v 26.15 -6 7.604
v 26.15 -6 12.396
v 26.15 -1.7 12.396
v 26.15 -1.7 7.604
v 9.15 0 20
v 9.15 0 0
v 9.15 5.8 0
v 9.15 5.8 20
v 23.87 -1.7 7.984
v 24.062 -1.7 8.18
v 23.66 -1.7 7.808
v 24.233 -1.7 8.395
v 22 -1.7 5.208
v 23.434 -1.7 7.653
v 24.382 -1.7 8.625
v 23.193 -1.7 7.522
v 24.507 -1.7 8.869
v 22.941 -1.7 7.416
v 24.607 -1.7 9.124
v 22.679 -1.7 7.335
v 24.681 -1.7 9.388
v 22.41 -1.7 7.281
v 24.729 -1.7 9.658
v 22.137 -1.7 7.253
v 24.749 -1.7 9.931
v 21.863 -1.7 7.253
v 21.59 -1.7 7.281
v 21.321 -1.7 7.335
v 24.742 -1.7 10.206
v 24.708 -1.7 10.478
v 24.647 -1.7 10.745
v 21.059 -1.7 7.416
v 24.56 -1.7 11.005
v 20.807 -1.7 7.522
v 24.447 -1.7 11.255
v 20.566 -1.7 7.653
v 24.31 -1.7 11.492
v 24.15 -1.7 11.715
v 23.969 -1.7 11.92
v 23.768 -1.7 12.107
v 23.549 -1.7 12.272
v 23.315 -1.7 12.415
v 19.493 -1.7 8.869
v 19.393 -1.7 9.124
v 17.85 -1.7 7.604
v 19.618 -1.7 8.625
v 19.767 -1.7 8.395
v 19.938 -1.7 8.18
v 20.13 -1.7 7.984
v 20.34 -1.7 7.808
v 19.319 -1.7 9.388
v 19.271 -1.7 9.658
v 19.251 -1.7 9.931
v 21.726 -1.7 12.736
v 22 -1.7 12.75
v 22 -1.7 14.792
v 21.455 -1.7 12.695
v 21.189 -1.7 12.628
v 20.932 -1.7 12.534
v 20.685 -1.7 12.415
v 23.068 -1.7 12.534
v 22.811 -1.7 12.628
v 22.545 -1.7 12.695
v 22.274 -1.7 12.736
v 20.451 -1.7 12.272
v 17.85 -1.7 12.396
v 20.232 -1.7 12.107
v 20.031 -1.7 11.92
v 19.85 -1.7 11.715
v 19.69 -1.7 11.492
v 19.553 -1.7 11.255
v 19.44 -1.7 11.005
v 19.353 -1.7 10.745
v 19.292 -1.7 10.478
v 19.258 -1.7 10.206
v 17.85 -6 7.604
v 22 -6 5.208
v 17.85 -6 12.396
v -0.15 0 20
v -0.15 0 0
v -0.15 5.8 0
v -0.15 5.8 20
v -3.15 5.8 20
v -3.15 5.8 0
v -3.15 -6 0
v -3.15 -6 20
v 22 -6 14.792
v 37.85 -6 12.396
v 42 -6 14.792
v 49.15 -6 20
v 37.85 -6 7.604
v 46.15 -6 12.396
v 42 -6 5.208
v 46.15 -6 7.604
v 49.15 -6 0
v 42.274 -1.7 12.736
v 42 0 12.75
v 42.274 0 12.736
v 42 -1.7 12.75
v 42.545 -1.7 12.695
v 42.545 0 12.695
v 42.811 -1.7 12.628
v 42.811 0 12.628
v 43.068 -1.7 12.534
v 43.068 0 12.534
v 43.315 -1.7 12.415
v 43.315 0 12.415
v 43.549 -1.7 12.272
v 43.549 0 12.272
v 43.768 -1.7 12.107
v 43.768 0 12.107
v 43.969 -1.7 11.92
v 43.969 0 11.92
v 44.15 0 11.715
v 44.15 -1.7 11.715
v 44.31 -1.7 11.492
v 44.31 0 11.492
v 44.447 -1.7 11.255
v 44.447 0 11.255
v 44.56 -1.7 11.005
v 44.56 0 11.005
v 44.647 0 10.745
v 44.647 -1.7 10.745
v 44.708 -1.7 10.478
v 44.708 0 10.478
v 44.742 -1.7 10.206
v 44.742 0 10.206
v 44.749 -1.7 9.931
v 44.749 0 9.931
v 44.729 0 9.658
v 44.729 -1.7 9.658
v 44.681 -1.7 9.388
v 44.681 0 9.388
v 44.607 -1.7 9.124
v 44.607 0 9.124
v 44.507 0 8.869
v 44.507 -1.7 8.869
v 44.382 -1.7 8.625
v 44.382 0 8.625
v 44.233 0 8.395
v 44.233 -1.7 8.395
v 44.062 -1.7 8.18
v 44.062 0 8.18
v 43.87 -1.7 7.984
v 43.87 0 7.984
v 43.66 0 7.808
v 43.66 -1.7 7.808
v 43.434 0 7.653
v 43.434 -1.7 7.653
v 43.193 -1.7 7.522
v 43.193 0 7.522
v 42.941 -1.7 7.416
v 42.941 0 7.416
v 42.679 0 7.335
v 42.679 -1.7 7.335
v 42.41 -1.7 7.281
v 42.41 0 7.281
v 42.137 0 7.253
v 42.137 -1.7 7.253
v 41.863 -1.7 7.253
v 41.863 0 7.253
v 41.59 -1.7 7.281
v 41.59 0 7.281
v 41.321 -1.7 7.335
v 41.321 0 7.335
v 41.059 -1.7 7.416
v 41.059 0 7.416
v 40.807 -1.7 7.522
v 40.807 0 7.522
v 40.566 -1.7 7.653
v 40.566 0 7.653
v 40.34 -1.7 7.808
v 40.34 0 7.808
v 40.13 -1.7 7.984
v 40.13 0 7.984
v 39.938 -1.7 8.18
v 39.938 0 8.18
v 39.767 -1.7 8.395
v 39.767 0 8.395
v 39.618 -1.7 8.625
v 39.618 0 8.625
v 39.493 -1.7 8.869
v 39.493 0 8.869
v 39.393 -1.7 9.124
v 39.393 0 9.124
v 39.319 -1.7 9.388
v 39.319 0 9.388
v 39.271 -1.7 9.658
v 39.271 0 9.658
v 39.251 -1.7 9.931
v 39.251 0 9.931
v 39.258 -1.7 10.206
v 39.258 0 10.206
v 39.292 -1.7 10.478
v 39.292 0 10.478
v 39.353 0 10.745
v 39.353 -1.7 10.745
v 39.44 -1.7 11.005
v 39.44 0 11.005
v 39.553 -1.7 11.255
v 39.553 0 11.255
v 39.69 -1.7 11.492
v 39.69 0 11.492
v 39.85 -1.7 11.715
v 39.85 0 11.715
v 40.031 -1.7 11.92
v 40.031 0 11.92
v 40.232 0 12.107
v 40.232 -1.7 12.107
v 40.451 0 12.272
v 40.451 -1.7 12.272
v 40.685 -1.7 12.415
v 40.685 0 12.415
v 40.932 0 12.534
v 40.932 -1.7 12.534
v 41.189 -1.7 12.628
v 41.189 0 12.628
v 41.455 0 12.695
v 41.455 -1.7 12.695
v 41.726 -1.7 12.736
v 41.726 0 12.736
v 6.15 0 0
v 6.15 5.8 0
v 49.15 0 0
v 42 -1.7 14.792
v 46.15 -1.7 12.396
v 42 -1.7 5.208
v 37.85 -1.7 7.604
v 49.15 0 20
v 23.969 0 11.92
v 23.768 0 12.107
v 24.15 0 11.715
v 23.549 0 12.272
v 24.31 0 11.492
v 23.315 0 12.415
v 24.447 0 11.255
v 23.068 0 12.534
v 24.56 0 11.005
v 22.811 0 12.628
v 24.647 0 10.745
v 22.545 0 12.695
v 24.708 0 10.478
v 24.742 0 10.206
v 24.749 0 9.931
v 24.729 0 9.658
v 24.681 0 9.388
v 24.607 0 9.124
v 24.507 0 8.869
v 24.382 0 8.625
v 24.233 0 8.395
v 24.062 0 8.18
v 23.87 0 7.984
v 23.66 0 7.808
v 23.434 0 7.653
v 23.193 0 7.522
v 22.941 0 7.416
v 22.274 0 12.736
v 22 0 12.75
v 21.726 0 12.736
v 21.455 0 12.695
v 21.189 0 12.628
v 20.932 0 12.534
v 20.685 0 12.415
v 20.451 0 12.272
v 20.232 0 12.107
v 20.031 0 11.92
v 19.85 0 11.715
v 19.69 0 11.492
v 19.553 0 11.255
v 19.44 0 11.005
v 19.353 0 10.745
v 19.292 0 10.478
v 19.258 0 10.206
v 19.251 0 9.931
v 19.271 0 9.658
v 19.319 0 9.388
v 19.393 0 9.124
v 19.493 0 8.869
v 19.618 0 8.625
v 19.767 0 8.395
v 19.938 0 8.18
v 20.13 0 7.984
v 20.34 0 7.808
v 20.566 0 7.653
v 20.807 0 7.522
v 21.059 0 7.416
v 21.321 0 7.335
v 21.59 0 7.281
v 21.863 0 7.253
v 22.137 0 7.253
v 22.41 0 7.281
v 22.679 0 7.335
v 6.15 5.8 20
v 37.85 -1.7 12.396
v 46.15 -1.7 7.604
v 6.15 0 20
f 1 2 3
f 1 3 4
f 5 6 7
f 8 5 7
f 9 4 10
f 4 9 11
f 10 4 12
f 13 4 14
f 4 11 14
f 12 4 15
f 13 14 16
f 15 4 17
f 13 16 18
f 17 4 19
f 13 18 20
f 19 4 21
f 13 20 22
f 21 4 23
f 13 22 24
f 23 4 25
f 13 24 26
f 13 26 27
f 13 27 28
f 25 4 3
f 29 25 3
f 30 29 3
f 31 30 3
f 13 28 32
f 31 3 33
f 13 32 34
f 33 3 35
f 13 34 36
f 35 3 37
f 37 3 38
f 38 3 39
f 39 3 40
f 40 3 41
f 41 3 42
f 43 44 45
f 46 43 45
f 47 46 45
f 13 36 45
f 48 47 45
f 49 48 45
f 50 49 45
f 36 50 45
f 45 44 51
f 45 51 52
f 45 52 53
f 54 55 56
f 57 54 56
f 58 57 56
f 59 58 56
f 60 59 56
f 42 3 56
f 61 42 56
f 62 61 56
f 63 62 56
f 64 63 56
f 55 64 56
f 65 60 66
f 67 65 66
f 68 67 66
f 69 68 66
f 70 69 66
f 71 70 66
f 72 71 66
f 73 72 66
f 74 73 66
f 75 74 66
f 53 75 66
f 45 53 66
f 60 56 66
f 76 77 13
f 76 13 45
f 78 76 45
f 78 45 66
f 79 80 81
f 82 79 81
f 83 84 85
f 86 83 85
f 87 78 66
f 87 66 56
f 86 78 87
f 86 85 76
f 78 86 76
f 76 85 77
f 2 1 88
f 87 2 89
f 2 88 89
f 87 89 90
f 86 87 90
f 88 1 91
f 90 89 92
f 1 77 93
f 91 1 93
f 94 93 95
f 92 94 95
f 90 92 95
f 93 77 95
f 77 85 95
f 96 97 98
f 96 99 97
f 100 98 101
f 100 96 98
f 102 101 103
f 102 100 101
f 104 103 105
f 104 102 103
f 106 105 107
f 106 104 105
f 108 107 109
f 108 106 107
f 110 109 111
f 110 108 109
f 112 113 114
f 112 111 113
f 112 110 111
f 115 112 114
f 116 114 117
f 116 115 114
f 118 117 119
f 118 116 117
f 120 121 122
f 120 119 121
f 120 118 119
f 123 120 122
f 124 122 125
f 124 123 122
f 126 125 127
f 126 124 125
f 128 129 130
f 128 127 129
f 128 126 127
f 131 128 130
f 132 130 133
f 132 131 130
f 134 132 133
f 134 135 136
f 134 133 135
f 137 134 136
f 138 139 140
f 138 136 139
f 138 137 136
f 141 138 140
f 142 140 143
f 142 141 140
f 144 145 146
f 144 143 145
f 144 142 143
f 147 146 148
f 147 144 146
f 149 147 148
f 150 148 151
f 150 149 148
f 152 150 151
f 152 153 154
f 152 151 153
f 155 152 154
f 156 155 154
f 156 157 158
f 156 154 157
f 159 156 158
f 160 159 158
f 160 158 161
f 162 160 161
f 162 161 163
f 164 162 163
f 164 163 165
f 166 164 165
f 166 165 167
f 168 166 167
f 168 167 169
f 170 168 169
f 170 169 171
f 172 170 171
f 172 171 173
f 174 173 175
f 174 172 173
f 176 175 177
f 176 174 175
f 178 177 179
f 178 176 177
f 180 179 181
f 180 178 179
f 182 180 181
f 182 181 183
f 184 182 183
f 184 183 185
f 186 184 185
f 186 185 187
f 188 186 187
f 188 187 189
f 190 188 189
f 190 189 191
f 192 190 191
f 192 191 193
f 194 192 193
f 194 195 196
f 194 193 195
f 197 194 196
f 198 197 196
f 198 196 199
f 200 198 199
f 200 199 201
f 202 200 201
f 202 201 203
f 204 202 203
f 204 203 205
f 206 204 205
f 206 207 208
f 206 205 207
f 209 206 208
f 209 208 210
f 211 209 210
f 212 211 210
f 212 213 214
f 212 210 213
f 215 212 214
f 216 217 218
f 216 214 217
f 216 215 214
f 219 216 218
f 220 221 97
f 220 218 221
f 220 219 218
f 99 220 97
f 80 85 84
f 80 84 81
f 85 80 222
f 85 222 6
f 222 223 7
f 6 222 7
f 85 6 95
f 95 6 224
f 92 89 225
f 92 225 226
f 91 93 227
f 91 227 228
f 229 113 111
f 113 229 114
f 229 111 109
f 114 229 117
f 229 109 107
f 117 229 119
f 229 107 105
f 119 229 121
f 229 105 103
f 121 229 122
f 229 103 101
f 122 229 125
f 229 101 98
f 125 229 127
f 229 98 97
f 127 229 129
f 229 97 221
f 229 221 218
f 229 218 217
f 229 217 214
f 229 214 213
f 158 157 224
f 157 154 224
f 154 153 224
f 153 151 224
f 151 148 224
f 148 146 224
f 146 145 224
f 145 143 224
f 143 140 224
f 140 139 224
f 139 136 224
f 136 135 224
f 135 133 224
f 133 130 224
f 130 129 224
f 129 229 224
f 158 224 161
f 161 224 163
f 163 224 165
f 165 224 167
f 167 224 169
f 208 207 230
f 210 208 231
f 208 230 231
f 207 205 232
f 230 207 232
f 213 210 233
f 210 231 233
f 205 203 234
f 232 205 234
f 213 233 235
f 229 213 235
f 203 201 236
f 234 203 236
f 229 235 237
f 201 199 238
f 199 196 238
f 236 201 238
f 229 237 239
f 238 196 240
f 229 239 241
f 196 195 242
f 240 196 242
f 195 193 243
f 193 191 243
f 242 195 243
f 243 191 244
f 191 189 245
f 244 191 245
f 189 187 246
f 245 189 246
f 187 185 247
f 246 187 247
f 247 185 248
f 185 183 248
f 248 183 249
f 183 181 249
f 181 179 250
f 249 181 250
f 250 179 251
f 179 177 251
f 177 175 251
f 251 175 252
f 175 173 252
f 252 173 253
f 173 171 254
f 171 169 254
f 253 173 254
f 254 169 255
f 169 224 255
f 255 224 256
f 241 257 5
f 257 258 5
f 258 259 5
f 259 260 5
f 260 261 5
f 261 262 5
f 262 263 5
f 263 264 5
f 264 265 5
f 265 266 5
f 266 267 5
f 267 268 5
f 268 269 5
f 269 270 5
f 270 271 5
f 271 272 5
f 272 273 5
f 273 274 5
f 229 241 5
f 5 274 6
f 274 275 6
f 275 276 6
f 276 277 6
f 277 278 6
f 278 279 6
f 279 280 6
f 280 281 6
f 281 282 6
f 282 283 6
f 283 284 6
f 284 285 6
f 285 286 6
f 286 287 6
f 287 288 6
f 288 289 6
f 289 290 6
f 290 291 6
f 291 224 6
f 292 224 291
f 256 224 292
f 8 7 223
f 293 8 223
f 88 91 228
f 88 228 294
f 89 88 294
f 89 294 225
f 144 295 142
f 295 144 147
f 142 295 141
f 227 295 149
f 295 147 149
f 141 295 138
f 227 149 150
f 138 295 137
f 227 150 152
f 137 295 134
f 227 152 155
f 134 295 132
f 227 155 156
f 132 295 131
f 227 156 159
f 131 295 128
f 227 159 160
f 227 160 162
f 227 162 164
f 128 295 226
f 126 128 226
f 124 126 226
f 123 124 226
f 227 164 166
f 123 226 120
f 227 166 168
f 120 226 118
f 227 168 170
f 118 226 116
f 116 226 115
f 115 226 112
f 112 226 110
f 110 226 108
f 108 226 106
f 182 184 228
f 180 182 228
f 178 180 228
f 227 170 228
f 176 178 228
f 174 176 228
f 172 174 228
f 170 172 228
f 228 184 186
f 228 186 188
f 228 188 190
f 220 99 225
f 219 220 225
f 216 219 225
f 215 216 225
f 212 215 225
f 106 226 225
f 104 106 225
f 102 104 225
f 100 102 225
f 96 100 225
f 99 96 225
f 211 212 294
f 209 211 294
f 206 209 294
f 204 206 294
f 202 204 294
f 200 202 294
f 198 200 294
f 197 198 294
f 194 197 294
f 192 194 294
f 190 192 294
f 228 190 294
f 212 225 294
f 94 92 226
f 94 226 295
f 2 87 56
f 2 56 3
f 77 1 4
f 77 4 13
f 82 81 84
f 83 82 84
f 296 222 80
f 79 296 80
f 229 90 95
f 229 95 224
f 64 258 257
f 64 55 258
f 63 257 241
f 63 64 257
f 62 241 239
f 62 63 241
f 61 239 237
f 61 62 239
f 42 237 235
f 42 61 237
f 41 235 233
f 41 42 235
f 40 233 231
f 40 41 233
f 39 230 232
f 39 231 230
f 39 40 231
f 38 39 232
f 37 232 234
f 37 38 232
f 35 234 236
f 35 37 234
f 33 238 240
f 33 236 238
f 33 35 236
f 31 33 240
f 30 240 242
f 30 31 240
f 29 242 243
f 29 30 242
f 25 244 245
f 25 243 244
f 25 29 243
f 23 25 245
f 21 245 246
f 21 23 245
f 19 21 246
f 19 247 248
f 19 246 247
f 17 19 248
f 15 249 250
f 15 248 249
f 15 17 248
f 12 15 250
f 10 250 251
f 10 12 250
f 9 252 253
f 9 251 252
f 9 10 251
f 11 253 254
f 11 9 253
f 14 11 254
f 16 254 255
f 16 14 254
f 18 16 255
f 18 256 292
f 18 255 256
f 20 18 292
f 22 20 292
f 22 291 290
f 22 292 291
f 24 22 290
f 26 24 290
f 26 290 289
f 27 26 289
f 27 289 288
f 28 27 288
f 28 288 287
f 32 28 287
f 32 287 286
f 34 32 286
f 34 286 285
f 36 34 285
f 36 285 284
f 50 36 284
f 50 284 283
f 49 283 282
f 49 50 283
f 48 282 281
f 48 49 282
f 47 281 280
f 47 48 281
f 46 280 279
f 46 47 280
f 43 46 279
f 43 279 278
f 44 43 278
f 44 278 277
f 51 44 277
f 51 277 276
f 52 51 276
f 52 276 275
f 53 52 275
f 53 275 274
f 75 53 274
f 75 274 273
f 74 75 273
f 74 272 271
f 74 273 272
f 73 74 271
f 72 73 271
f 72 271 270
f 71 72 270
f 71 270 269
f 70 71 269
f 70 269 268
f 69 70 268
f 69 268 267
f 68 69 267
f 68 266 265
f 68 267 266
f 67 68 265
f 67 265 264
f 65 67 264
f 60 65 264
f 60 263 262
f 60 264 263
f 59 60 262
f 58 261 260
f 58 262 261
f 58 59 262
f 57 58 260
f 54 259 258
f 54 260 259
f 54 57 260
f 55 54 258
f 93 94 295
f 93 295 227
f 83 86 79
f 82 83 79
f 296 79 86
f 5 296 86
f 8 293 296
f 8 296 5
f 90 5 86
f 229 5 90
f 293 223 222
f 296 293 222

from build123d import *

# Parameters (mm, degrees)
EXTRUDE_20_DEPTH         = 20
CUT_EXTRUDE_5_DEPTH      = 54.401521514
CUT_EXTRUDE_5_DEPTH_BACK = 54.401521514
SKETCH_5_R               = 2.75
CUT_EXTRUDE_5_4_3_DEPTH  = 4.3


with BuildPart() as part:
    # Профиль_скобы_6мм → Печатный_корпус_20мм (new body)
    with BuildSketch(Plane.XY):
        Polygon((-3.15, -6), (49.15, -6), (49.15, 0), (9.15, 0), (9.15, 5.8), (6.15, 5.8), (6.15, 0), (-0.15, 0), (-0.15, 5.8), (-3.15, 5.8), align=None)
    extrude(amount=EXTRUDE_20_DEPTH)

    # Sketch 5 → Винты_полки_М5 (cut, two sides: drawn at the far end of the back side and taken through both)
    with BuildSketch(Plane(origin=(0, 0, 0), x_dir=(1, 0, 0), z_dir=(0, 1, 0)).offset(-CUT_EXTRUDE_5_DEPTH_BACK)):
        with Locations(Location((22, -10, 0), (0, 0, 270))):
            Circle(SKETCH_5_R)
        with Locations(Location((42, -10, 0), (0, 0, 270))):
            Circle(SKETCH_5_R)
    extrude(amount=CUT_EXTRUDE_5_DEPTH + CUT_EXTRUDE_5_DEPTH_BACK, mode=Mode.SUBTRACT)

    # Sketch 5 2 → Гайки_полки_М5_4_3мм (cut)
    with BuildSketch(Plane.XZ.offset(6)):
        Polygon((22, 14.792007234), (26.15, 12.396003617), (26.15, 7.603996383), (22, 5.207992766), (17.85, 7.603996383), (17.85, 12.396003617), align=None)
        Polygon((42, 14.792007234), (46.15, 12.396003617), (46.15, 7.603996383), (42, 5.207992766), (37.85, 7.603996383), (37.85, 12.396003617), align=None)
    extrude(amount=-CUT_EXTRUDE_5_4_3_DEPTH, mode=Mode.SUBTRACT)


solid = part.part
